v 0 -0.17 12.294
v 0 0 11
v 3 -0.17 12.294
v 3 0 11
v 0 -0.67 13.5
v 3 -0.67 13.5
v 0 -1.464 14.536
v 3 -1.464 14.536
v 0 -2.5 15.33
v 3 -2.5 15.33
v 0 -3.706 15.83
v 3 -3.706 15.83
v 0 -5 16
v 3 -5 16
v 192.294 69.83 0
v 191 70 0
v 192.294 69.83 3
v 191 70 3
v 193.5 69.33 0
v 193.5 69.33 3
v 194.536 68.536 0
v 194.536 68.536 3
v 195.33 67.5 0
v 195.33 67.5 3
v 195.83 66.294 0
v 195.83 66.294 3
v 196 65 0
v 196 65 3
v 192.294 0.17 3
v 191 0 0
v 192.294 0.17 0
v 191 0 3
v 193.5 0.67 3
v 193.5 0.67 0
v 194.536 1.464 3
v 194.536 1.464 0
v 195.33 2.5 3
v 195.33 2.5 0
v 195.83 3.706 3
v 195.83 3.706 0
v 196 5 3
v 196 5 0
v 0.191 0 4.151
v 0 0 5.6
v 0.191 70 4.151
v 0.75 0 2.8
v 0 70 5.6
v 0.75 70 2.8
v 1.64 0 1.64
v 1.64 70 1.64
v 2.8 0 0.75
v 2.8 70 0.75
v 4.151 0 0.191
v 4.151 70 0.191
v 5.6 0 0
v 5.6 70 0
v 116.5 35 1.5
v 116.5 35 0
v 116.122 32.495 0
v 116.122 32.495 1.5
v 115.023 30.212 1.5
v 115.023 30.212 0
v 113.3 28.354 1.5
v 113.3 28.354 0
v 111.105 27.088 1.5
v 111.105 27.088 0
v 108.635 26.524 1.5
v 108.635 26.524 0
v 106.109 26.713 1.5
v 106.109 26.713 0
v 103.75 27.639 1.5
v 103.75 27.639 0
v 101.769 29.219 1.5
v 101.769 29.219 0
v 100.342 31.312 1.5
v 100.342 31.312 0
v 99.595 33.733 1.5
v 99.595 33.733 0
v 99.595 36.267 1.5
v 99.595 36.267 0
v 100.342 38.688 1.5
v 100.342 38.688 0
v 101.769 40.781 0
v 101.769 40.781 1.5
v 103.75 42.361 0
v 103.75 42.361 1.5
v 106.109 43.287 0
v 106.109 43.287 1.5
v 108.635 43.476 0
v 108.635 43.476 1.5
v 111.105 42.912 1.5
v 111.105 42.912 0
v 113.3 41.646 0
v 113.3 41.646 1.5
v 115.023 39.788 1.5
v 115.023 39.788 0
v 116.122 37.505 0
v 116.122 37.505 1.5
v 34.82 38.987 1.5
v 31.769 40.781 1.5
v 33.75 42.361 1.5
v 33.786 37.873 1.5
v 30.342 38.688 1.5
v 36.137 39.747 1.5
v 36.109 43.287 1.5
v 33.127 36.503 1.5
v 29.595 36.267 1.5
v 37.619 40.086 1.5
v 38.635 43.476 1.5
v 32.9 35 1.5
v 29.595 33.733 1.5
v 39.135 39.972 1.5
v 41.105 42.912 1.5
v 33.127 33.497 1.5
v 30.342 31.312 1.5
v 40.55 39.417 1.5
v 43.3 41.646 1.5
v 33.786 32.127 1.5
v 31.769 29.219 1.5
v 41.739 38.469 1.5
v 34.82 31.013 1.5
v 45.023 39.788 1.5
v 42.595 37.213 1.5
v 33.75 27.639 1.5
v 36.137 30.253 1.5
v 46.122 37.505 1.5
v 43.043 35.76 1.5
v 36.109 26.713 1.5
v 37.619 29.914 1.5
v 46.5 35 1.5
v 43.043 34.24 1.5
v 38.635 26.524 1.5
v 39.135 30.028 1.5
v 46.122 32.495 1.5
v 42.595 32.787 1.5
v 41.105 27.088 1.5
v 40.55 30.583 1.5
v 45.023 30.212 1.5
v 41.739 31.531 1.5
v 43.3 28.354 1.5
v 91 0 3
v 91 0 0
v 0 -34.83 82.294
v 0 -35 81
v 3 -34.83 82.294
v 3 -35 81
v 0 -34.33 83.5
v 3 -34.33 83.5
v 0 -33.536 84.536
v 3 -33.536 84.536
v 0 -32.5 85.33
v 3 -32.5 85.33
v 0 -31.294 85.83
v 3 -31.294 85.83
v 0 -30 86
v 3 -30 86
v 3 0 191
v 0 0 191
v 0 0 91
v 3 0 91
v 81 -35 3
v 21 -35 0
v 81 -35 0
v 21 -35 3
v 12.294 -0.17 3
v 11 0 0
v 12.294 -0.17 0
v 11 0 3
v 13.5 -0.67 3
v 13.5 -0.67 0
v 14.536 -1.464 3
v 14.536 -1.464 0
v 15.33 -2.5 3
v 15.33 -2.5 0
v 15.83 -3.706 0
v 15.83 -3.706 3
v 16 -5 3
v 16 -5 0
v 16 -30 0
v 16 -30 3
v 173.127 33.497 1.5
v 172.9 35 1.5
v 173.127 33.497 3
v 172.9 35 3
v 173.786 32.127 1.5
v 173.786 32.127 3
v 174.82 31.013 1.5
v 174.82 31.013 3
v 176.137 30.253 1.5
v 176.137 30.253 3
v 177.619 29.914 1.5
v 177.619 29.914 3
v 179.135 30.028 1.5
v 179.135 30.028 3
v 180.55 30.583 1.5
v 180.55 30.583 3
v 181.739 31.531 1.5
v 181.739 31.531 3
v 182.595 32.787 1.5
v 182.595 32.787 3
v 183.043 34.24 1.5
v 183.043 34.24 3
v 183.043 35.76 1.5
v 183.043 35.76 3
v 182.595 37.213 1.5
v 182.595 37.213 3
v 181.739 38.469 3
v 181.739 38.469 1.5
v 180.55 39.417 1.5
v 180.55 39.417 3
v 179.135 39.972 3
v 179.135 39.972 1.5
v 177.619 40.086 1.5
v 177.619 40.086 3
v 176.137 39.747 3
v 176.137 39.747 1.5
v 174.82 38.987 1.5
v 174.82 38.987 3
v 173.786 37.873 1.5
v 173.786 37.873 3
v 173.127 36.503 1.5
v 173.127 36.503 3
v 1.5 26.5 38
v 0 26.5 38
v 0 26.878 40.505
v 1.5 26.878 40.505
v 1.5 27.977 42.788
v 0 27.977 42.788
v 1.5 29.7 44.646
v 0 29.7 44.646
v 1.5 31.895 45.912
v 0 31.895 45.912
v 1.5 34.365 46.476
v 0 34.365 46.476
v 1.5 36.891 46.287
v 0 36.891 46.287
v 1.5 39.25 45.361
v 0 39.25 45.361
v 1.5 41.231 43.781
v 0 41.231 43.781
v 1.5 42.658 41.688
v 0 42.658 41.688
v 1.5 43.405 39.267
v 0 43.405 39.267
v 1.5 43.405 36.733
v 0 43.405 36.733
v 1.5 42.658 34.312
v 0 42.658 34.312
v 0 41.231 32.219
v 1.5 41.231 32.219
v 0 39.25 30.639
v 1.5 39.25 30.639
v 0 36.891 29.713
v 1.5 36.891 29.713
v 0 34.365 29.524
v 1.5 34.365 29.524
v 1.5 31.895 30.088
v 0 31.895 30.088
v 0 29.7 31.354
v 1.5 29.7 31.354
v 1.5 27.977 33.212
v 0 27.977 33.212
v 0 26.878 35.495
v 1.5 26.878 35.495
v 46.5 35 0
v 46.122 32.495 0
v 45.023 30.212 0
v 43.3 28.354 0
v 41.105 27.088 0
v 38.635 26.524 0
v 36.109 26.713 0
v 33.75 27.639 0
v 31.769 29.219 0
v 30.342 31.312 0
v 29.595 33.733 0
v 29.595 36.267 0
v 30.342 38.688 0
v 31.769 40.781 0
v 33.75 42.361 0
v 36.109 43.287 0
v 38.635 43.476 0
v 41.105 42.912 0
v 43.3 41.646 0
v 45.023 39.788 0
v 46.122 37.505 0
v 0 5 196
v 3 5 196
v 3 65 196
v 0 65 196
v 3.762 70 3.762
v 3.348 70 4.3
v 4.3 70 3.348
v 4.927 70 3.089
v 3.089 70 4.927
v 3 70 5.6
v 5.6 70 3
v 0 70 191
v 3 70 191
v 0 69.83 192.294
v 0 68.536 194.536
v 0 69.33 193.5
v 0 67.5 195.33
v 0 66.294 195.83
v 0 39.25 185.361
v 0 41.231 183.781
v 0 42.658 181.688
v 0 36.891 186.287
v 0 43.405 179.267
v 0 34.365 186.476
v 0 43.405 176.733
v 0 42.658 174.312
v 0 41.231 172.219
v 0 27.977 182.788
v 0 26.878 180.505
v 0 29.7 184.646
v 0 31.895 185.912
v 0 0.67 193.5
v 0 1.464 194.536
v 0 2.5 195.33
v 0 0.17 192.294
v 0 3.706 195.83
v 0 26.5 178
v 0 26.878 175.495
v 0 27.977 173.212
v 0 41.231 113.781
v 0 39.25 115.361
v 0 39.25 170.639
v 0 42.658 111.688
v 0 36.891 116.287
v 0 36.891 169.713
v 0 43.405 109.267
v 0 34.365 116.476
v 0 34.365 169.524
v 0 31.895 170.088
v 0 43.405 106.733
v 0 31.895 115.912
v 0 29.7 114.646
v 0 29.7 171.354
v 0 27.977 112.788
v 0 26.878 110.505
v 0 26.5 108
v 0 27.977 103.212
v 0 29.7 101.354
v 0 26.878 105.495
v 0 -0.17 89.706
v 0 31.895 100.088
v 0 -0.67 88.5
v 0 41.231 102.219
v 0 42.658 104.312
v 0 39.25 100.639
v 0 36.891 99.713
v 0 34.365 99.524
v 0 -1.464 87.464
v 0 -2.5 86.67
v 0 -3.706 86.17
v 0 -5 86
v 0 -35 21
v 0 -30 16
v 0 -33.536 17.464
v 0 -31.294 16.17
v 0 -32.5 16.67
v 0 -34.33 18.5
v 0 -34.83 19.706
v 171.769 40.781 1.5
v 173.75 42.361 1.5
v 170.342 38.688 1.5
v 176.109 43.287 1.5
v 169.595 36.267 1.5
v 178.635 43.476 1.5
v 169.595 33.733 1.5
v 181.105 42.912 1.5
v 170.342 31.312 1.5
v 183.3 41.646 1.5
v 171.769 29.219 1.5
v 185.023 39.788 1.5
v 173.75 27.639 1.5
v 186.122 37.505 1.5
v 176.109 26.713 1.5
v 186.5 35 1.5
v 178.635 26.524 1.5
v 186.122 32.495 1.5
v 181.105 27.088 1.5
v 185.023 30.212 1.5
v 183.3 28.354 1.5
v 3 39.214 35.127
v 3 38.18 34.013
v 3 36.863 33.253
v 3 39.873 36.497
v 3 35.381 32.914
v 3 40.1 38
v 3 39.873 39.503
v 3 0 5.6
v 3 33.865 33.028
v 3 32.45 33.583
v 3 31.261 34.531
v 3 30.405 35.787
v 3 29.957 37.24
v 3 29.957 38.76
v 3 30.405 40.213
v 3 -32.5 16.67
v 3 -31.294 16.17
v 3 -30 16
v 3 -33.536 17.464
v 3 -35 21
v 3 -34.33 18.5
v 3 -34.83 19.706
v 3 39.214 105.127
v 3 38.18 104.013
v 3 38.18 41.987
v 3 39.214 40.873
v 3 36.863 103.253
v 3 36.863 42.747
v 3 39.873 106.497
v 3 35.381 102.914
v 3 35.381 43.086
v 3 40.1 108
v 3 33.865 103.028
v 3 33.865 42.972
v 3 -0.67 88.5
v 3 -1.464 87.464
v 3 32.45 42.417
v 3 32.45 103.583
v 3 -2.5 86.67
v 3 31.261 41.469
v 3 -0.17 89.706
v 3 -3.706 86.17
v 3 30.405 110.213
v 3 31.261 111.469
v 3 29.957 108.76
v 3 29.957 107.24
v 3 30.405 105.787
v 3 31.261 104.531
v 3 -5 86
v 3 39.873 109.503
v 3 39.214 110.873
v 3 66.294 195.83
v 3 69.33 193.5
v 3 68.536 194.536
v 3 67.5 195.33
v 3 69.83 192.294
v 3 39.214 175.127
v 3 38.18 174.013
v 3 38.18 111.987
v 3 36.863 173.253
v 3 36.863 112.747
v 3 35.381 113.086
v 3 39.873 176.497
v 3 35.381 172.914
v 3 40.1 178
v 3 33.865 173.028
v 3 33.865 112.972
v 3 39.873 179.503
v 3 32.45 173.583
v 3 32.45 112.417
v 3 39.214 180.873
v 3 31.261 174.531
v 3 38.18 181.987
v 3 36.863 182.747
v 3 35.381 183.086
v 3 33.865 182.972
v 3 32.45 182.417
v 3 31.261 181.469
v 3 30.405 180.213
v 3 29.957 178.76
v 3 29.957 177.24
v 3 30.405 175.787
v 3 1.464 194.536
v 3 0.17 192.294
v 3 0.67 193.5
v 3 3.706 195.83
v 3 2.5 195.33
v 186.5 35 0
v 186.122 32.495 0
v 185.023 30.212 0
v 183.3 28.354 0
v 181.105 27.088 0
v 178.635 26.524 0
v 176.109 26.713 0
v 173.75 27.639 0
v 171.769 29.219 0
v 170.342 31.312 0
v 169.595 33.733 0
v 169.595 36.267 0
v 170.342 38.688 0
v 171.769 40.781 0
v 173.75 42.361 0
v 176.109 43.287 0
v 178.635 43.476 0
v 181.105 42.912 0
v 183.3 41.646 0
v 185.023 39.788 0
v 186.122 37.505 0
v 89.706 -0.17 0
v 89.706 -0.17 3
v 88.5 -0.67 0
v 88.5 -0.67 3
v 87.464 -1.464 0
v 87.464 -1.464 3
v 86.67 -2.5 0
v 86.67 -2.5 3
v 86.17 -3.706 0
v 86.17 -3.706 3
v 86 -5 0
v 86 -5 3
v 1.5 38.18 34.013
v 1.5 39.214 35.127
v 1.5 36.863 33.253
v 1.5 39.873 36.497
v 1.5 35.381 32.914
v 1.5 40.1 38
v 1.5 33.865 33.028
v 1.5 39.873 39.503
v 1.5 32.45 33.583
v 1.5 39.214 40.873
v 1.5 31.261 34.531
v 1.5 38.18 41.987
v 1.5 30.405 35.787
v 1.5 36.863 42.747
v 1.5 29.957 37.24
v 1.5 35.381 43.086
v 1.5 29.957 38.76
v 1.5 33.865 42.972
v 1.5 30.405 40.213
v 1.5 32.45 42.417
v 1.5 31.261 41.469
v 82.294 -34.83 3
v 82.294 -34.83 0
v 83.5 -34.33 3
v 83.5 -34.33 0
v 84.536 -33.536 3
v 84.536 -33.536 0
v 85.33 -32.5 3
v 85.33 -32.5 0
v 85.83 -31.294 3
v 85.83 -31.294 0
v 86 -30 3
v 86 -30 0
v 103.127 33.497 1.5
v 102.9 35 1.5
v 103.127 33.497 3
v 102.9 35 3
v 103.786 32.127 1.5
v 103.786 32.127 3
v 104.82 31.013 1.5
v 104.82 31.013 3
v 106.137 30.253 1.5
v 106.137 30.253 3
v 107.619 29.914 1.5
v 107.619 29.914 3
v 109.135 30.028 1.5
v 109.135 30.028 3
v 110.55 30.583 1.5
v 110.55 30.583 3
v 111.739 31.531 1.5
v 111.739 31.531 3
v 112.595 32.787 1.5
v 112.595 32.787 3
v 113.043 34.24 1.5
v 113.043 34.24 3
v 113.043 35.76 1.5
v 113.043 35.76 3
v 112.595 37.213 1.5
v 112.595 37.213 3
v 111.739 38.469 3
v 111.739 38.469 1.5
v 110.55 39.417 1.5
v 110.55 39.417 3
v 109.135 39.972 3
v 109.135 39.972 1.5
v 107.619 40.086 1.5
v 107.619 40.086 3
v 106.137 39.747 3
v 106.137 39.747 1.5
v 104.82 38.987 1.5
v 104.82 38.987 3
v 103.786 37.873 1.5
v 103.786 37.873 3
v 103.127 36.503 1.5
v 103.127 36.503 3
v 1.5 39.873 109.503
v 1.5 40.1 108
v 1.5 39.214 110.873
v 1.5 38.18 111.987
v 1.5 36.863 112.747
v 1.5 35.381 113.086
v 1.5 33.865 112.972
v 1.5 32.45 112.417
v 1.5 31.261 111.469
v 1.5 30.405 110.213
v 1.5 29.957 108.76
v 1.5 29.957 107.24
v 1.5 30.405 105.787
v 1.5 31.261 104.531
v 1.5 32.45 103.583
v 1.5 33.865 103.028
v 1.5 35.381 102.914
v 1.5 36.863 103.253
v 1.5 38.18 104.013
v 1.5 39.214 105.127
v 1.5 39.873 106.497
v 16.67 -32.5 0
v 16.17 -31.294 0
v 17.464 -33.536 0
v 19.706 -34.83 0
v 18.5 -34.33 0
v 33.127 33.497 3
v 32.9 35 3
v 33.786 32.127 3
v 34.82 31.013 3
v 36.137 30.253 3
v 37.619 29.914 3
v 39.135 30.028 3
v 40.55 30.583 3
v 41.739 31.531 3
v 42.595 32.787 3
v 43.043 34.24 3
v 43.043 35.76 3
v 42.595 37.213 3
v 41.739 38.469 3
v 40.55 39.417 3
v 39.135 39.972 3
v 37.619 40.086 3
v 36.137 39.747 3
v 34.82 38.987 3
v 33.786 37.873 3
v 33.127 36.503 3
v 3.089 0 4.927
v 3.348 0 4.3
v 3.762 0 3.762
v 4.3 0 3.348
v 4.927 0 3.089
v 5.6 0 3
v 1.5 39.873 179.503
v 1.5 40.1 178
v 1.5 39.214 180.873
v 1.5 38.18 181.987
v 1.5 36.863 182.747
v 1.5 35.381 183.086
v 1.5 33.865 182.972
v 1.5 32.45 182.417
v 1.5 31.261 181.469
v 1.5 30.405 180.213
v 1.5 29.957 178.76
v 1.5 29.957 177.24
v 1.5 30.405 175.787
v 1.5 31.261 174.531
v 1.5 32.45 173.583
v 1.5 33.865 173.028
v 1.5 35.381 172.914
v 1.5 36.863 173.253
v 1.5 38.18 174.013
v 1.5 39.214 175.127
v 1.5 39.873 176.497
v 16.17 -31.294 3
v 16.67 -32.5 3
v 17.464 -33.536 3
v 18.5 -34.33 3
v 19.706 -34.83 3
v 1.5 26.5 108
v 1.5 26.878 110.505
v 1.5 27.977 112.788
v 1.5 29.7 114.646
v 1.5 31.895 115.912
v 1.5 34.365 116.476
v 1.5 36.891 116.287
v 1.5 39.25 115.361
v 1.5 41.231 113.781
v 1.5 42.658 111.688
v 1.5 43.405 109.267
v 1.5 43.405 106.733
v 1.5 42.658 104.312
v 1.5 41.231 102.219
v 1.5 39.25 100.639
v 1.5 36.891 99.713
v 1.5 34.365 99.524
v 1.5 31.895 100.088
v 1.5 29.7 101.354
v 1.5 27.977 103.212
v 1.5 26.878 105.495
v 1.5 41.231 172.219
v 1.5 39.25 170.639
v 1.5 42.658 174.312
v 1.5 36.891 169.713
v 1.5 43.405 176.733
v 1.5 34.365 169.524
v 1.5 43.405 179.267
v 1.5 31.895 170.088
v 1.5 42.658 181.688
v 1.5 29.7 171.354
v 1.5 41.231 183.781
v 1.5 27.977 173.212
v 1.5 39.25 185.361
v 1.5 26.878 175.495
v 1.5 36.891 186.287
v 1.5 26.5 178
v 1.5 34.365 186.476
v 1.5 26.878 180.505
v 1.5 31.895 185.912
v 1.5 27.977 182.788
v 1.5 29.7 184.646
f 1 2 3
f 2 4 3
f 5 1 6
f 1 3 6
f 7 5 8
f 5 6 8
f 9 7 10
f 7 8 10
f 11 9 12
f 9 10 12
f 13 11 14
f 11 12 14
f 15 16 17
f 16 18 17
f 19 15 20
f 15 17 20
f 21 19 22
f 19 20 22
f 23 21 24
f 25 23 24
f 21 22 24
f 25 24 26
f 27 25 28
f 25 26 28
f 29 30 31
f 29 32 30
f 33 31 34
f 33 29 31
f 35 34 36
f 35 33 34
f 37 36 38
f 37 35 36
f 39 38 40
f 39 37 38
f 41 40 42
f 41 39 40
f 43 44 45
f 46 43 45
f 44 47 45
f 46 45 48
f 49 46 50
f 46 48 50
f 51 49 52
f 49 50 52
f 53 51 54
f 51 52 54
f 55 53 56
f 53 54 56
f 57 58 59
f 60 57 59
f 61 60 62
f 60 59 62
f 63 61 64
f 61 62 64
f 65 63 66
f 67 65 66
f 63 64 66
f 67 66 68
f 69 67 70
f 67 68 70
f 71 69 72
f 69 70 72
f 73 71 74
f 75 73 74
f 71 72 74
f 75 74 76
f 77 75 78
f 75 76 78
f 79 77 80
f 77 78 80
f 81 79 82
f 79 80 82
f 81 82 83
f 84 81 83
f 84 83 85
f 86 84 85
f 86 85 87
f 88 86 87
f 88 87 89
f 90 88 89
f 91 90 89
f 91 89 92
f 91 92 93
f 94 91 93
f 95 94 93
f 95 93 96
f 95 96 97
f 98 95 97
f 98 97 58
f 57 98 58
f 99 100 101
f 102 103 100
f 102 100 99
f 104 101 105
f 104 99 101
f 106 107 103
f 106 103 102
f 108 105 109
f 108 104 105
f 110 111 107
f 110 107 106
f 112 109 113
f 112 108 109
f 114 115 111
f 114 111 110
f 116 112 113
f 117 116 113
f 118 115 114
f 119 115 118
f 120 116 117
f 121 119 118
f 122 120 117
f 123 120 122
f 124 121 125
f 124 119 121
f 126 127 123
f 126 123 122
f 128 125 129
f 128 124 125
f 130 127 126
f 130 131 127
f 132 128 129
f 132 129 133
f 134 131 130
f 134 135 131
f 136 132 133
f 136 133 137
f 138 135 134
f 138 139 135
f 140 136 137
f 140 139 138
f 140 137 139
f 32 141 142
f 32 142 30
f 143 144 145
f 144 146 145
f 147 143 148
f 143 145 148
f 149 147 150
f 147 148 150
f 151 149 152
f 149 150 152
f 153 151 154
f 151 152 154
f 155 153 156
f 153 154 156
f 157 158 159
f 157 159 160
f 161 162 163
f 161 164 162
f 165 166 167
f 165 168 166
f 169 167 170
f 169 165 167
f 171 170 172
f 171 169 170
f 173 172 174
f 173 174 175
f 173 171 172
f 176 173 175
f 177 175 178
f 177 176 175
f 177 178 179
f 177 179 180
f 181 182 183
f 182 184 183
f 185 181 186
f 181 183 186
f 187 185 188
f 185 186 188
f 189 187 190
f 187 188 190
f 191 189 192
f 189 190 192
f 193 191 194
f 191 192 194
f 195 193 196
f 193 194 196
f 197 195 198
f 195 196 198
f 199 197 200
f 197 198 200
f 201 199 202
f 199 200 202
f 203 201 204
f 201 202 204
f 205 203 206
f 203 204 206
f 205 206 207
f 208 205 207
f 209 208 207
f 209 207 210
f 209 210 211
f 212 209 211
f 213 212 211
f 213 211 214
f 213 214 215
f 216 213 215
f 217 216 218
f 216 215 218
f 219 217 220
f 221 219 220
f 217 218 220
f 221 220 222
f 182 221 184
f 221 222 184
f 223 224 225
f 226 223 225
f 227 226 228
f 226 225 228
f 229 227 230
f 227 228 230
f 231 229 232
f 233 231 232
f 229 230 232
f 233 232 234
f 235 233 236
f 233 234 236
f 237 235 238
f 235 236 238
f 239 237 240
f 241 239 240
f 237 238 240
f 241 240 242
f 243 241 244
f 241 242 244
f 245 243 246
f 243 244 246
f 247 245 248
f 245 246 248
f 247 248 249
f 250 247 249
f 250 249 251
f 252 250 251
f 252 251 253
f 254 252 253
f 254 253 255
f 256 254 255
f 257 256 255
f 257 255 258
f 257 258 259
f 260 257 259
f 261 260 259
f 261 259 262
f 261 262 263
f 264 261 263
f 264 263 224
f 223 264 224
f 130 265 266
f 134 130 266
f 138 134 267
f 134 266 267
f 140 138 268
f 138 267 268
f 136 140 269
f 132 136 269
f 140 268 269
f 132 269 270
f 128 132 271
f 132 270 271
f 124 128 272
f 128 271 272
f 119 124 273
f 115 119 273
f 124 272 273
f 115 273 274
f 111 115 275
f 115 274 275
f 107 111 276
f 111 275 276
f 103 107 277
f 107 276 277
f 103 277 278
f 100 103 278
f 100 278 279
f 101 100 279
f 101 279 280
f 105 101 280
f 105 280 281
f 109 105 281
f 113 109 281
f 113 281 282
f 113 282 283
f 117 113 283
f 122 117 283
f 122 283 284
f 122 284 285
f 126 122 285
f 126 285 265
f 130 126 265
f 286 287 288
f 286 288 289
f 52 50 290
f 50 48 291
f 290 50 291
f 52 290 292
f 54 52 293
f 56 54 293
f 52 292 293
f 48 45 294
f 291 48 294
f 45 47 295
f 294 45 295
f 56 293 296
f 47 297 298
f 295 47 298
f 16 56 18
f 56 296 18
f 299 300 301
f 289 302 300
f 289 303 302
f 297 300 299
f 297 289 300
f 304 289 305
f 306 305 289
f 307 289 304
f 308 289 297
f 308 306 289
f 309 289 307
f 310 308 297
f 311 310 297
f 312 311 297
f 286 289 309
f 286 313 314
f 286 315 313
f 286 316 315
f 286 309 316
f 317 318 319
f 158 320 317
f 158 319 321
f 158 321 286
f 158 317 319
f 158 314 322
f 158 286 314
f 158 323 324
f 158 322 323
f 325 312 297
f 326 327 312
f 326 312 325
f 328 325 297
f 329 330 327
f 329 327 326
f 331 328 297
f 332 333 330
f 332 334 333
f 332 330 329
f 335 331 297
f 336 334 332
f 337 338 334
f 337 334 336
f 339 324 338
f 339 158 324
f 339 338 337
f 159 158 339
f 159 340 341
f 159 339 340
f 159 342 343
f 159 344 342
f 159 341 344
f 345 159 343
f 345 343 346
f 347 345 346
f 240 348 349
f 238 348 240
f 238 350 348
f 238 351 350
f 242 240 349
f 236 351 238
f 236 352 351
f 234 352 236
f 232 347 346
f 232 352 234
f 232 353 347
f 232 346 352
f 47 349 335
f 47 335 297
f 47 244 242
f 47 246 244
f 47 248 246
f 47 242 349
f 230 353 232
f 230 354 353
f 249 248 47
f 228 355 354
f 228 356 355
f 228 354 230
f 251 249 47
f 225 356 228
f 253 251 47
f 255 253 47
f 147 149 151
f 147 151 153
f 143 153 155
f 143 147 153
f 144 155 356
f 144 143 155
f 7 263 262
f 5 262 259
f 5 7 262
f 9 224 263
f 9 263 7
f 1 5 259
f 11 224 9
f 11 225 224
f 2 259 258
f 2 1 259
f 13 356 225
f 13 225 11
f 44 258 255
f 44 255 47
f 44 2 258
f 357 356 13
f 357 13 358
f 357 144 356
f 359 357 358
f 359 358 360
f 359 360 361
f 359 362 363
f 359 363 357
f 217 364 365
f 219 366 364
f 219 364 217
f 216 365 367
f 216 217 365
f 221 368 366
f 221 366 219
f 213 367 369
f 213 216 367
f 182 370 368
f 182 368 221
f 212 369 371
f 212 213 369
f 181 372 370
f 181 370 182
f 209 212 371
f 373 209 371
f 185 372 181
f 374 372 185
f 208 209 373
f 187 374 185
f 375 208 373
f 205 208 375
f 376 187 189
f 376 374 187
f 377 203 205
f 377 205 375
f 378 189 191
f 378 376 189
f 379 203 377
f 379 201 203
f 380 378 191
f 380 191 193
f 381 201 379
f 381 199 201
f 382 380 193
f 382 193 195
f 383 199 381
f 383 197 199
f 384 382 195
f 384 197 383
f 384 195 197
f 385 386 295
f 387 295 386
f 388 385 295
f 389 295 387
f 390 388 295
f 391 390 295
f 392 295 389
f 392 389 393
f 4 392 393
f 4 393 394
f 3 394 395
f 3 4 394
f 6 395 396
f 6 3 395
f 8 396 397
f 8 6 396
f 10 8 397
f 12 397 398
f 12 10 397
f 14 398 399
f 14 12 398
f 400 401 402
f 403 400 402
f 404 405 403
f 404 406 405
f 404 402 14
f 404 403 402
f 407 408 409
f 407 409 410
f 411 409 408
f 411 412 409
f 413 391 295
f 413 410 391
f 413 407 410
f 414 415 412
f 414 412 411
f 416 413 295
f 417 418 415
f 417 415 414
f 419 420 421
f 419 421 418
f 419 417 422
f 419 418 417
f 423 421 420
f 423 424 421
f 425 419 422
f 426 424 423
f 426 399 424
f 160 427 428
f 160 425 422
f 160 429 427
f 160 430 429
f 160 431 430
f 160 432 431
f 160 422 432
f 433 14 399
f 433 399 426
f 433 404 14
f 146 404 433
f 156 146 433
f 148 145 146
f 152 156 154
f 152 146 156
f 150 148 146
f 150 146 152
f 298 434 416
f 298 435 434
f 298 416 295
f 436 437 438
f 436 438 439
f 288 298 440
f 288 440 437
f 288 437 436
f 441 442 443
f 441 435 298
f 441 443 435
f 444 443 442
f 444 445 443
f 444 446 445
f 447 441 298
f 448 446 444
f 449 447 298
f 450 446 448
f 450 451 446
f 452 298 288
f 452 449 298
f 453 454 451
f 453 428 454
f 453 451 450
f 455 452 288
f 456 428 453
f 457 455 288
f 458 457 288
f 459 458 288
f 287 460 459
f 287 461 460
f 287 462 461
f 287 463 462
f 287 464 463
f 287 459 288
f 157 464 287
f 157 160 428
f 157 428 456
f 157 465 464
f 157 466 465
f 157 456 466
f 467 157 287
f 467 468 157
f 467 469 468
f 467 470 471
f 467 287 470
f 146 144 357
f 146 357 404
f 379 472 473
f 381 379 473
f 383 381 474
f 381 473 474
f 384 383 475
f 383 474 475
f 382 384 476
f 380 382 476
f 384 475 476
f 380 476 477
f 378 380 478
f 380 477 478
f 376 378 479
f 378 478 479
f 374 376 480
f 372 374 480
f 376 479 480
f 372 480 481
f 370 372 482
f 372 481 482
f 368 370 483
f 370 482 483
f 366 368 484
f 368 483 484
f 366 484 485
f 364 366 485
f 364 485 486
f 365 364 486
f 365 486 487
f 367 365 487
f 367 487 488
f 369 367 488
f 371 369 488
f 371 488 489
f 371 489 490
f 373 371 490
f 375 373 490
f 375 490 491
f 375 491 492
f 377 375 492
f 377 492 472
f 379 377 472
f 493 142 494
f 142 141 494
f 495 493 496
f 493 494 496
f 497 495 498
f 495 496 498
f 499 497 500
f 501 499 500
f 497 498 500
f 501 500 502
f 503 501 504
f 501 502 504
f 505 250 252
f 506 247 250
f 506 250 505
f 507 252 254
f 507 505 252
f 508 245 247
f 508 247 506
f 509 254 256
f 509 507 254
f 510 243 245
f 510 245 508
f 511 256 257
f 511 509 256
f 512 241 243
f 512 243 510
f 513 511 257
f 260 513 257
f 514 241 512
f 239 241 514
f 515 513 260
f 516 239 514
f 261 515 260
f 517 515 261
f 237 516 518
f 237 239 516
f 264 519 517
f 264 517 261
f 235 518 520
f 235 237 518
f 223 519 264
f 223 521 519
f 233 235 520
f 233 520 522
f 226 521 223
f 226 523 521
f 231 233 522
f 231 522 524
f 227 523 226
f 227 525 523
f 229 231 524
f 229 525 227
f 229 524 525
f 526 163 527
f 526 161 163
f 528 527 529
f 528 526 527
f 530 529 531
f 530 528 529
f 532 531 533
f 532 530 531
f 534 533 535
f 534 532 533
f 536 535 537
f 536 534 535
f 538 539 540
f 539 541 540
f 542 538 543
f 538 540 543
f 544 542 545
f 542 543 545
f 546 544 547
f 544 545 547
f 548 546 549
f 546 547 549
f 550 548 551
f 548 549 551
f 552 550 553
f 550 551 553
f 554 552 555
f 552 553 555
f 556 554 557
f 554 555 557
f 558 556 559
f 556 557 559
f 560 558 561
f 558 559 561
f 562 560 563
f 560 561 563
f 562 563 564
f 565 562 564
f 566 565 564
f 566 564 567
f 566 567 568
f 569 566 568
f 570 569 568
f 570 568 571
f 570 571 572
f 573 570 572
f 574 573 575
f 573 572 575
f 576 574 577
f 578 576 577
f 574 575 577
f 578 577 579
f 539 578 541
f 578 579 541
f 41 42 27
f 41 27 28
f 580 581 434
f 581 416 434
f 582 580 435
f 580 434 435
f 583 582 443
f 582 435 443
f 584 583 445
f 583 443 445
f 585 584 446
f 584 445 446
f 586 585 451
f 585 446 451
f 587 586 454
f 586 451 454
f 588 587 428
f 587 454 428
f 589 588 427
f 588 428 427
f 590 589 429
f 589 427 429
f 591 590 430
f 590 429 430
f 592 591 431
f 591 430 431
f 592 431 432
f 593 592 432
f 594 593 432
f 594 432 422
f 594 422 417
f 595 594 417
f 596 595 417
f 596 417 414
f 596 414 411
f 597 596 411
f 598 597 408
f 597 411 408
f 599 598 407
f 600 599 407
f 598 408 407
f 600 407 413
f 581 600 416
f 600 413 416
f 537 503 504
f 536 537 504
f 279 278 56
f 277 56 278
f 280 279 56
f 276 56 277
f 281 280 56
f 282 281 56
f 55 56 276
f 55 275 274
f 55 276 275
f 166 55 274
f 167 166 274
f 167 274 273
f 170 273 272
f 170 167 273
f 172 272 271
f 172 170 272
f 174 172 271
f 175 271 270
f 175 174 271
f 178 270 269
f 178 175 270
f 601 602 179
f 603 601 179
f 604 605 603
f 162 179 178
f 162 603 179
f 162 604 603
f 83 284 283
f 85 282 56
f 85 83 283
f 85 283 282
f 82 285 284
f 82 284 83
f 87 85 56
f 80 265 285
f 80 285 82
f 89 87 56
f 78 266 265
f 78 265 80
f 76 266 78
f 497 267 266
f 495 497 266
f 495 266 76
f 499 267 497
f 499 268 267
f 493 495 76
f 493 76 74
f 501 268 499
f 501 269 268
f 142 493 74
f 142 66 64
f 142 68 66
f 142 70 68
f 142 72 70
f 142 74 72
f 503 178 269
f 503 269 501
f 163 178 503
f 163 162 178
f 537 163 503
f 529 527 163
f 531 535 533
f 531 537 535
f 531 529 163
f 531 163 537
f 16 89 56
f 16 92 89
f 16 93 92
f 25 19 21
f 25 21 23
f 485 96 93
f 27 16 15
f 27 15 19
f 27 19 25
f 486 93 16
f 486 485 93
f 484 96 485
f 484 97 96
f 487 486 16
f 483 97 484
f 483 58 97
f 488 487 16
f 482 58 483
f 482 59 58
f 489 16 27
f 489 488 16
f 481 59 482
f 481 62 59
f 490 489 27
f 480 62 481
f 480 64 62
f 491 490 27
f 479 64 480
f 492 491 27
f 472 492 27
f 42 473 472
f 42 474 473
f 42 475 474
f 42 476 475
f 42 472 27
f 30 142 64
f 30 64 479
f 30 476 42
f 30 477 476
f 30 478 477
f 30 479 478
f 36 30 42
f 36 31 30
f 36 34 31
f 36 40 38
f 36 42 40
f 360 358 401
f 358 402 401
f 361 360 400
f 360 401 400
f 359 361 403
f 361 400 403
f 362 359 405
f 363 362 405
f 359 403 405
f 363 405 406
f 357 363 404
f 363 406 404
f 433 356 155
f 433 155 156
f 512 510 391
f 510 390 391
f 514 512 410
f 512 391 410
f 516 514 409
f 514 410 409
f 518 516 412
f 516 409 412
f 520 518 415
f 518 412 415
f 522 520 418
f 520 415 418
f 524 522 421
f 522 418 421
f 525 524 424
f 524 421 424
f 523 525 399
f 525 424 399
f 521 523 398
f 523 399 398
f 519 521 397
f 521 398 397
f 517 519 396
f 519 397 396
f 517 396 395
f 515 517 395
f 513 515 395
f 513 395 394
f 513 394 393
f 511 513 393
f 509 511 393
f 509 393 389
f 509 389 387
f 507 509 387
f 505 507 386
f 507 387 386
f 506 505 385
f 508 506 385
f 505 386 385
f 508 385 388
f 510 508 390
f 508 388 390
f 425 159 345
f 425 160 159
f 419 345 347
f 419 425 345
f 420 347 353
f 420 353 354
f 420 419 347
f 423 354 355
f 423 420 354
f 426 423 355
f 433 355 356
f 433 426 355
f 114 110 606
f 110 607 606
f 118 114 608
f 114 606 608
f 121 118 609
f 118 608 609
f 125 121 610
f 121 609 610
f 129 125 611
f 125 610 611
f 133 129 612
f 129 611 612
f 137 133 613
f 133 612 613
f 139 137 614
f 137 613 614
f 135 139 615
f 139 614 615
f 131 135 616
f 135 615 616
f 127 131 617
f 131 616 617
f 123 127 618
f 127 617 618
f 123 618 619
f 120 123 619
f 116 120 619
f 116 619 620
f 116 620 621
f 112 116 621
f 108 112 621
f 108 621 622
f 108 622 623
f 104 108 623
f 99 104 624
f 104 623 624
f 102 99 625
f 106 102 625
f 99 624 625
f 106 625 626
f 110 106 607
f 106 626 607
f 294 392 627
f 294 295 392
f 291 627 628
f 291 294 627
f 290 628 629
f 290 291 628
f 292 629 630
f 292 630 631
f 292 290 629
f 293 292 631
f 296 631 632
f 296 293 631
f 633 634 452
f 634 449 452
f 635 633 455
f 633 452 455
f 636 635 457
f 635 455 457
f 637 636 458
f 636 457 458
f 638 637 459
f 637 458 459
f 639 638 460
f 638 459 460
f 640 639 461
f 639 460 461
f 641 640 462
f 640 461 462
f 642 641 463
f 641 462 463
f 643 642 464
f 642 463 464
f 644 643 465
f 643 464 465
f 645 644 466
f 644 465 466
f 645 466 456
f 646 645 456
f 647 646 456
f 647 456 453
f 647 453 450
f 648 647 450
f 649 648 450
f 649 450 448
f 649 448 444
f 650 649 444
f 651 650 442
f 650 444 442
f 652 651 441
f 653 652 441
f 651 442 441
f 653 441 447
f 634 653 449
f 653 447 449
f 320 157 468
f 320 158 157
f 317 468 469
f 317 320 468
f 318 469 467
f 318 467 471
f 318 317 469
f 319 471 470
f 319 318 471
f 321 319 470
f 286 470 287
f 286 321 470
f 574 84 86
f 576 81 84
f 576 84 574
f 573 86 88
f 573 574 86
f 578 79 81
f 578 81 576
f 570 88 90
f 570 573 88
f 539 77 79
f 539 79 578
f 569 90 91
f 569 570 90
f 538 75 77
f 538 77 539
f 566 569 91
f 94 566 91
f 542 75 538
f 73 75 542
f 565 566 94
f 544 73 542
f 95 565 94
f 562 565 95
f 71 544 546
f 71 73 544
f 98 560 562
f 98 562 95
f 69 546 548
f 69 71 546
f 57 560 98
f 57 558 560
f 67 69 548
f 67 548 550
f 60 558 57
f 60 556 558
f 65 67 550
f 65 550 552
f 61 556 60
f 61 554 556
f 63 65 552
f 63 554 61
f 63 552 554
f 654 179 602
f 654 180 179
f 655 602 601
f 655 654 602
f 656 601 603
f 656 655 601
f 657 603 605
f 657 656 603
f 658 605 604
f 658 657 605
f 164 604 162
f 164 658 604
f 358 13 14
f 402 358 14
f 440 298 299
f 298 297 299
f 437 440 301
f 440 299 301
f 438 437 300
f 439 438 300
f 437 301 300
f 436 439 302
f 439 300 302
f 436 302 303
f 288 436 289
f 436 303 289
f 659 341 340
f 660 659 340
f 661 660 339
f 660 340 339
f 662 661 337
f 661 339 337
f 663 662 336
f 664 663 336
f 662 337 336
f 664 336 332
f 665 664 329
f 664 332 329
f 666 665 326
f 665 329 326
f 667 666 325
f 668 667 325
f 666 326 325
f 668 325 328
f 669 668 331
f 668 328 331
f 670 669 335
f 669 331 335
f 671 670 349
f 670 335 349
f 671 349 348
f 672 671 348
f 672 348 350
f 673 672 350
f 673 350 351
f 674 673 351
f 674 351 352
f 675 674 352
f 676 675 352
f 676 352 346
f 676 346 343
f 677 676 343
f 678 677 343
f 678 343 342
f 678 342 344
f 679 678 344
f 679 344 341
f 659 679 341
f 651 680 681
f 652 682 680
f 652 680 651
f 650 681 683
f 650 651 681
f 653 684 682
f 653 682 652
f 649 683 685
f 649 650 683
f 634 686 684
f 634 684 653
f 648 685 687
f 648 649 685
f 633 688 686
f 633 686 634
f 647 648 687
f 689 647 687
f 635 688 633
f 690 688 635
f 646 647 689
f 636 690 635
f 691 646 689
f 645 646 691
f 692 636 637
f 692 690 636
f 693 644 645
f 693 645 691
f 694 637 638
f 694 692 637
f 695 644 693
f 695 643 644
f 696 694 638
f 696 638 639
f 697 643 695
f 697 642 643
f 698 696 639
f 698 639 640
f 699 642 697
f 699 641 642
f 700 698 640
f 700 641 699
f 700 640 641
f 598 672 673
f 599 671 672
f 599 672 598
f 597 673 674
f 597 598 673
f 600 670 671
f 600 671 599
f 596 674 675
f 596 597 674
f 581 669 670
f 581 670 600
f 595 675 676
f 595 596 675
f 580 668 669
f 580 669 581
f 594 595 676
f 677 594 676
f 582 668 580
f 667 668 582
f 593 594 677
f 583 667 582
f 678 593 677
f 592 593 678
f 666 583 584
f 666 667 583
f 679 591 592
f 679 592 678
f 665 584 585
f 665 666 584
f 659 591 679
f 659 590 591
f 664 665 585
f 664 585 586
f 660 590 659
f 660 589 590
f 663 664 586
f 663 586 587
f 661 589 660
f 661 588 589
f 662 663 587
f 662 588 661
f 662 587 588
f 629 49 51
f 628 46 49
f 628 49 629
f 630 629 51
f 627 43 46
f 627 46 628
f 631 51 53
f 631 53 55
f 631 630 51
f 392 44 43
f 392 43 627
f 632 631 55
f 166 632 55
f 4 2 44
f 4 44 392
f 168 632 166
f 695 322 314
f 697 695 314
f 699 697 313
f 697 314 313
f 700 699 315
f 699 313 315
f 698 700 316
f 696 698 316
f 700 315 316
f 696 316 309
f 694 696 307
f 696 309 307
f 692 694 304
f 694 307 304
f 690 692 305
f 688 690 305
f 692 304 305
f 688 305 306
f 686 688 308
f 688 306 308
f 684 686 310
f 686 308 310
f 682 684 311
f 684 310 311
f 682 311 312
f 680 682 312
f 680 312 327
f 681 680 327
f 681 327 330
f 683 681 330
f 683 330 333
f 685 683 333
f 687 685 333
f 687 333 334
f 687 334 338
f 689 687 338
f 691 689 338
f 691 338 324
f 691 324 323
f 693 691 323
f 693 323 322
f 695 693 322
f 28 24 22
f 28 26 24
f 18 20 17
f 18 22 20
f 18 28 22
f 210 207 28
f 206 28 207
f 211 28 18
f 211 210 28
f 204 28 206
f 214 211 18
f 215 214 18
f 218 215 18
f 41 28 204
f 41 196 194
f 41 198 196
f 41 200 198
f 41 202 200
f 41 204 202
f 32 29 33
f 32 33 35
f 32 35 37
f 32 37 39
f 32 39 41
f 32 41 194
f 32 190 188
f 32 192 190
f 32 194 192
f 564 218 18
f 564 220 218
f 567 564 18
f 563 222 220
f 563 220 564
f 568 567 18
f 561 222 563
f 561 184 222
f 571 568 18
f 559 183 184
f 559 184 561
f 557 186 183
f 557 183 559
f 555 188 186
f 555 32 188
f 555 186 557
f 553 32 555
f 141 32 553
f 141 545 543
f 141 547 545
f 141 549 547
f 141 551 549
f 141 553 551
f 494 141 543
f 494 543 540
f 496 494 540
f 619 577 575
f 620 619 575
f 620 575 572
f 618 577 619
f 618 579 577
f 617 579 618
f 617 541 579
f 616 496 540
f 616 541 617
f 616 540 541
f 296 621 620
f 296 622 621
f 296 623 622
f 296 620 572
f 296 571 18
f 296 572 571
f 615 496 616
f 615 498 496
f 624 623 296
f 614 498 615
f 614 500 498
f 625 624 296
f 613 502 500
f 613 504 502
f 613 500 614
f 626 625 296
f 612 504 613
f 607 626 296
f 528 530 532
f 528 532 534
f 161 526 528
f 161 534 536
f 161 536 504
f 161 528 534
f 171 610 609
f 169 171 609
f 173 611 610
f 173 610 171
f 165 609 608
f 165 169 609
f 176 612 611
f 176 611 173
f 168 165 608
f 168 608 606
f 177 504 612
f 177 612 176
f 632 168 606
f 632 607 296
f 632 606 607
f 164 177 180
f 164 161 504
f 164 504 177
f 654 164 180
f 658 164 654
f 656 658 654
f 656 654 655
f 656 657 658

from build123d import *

# Parameters (mm, degrees)
F2_DEPTH              = 70
F3_R                  = 5.6
F4_R                  = 2.6
F5_W                  = 70
F5_H                  = 3
F5_W_2                = 3
F5_H_2                = 70
F6_DEPTH              = 35
F7_R                  = 5
F10_D                 = 10.2
F10_CBORE_D           = 17
F10_CBORE_DEPTH       = 1.5
F10_ON_F9_D           = 10.2
F10_ON_F9_CBORE_D     = 17
F10_ON_F9_CBORE_DEPTH = 1.5


with BuildPart() as f2:
    # F1 (on Front) → F2 (new body)
    with BuildSketch(Plane.XZ):
        Polygon((3, 196), (0, 196), (0, 0), (196, 0), (196, 3), (3, 3), align=None)
    extrude(amount=-F2_DEPTH)

    # F3
    f3_edges = [f2.edges().sort_by_distance(p)[0] for p in [
        (0, 35, 0),
    ]]
    fillet(f3_edges, radius=F3_R)

    # F4
    f4_edges = [f2.edges().sort_by_distance(p)[0] for p in [
        (3, 35, 3),
    ]]
    fillet(f4_edges, radius=F4_R)

    # F5 (on face) → F6 (join)
    with BuildSketch(Plane.XZ):
        with Locations((51, 1.5)):
            Rectangle(F5_W, F5_H)
        with Locations((1.5, 51)):
            Rectangle(F5_W_2, F5_H_2)
    extrude(amount=F6_DEPTH)

    # F7
    f7_edges = [f2.edges().sort_by_distance(p)[0] for p in [
        (16, 0, 1.5),
        (16, -35, 1.5),
        (86, -35, 1.5),
        (86, 0, 1.5),
        (1.5, -35, 16),
        (1.5, -35, 86),
        (1.5, 0, 16),
        (1.5, 0, 86),
        (1.5, 0, 196),
        (1.5, 70, 196),
        (196, 70, 1.5),
        (196, 0, 1.5),
    ]]
    fillet(f7_edges, radius=F7_R)

    # F10 (through all)
    with Locations(Plane(origin=(0, 0, 0), x_dir=(1, 0, 0), z_dir=(0, 0, -1))):
        with Locations((38, -35), (108, -35), (178, -35)):
            CounterBoreHole(F10_D / 2, F10_CBORE_D / 2, F10_CBORE_DEPTH)

    # F10 on F9 (through all)
    with Locations(Plane(origin=(0, 0, 0), x_dir=(0, -1, 0), z_dir=(-1, 0, 0))):
        with Locations((-35, 178), (-35, 108), (-35, 38)):
            CounterBoreHole(F10_ON_F9_D / 2, F10_ON_F9_CBORE_D / 2, F10_ON_F9_CBORE_DEPTH)


solid = f2.part
